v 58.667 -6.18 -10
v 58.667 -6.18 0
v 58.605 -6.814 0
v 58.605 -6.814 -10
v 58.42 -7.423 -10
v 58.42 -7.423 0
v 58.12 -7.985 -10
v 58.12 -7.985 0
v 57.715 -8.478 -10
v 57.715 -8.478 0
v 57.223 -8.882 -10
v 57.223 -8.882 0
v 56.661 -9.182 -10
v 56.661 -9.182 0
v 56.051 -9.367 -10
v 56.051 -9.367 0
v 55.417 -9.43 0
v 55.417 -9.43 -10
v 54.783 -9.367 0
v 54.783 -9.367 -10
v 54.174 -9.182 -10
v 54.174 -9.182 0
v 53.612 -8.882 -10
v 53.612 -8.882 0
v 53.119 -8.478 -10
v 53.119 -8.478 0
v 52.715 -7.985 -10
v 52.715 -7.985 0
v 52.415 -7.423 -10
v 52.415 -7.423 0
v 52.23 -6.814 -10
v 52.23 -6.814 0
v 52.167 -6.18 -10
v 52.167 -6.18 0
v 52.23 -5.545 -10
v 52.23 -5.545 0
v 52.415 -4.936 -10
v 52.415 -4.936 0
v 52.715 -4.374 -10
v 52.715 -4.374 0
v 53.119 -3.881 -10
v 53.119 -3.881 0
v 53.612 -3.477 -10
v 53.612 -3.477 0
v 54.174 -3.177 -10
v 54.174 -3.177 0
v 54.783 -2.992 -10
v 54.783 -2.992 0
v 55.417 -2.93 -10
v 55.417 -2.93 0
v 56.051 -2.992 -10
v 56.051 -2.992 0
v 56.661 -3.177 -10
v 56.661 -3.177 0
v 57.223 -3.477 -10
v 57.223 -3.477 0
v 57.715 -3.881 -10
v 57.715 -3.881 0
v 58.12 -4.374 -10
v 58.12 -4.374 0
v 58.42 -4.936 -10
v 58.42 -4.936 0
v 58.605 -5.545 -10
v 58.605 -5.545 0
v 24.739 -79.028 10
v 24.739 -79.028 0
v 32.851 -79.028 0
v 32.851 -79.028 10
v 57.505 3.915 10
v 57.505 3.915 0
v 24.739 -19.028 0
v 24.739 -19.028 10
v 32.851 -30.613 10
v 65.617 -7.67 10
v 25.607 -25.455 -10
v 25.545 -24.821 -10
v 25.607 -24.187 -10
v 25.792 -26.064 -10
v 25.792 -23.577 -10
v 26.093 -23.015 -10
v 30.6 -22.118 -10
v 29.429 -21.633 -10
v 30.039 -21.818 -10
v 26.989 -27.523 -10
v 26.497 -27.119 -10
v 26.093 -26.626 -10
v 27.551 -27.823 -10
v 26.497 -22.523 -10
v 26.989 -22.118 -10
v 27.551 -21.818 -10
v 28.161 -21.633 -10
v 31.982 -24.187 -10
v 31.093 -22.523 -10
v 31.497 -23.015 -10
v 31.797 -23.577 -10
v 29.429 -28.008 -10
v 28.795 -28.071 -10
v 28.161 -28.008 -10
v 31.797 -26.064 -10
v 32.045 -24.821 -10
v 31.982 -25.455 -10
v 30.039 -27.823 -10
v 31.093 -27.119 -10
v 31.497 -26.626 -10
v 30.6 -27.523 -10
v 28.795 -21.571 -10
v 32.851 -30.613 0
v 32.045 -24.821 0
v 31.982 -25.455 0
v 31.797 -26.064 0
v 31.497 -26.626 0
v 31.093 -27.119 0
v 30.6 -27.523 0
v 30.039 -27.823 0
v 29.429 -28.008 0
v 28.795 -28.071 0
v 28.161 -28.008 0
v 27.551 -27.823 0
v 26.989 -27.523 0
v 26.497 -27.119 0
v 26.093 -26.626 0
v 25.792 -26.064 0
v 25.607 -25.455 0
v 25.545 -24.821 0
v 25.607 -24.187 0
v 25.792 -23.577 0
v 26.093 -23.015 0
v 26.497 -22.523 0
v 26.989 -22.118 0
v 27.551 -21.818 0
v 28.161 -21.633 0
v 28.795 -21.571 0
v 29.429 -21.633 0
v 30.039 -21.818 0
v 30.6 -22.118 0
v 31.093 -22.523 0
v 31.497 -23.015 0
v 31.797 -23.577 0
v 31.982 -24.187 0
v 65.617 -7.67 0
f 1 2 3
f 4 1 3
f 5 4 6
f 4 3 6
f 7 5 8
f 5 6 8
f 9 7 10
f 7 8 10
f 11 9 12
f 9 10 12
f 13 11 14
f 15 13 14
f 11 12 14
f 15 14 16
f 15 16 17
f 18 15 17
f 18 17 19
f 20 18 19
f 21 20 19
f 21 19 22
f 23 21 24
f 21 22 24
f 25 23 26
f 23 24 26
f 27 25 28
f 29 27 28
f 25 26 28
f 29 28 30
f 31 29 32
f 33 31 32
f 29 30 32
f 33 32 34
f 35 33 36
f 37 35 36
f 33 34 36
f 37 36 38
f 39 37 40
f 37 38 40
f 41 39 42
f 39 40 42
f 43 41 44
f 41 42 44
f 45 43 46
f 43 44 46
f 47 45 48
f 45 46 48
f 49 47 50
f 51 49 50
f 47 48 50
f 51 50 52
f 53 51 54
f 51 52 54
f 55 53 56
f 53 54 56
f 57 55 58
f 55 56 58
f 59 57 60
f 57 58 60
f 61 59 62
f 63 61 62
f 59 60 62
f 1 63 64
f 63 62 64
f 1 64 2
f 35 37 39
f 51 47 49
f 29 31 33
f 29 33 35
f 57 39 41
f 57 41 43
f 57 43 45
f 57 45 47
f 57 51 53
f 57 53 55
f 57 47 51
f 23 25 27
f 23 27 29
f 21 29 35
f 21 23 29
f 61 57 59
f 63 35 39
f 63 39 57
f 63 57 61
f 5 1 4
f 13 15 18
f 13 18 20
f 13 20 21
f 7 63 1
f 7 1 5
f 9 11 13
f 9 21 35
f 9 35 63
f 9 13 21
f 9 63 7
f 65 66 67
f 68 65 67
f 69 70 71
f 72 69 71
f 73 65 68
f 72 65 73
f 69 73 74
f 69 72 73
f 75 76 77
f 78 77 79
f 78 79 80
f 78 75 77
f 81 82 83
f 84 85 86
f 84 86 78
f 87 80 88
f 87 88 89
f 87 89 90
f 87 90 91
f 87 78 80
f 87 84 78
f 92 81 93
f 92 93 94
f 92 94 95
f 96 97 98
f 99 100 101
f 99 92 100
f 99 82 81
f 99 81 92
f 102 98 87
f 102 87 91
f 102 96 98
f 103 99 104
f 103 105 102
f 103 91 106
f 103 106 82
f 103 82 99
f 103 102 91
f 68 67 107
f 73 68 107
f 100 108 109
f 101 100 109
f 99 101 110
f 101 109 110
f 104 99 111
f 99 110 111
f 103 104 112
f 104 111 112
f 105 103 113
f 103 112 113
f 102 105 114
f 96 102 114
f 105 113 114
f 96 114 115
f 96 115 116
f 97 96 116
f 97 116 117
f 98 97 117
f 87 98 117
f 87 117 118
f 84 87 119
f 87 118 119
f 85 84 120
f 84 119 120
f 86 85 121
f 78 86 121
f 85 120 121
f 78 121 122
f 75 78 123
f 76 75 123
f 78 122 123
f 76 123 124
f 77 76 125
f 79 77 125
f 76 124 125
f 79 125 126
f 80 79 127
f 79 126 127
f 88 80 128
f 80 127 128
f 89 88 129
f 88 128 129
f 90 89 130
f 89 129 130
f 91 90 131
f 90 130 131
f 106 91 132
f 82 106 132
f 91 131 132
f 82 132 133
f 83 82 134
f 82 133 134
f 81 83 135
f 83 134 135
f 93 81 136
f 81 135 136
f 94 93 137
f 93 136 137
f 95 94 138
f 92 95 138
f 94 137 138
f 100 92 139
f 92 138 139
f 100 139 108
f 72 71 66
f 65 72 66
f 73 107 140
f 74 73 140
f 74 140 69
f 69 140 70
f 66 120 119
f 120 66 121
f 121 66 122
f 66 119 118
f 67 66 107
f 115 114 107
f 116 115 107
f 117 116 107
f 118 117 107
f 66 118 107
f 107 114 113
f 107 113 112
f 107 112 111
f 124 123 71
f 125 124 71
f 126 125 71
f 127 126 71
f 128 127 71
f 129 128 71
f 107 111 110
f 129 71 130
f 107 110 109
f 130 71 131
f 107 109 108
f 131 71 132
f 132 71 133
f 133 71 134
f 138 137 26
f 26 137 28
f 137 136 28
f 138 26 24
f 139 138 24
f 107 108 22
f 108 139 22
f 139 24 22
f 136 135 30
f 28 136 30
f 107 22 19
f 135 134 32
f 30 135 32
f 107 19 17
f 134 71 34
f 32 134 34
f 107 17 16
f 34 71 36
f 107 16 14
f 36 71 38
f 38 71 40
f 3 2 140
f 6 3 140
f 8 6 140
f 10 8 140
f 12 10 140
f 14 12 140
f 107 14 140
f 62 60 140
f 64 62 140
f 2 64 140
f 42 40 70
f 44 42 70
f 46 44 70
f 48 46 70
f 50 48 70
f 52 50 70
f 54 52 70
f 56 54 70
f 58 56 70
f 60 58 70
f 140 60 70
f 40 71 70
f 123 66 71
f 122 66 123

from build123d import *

# Parameters (mm, degrees)
BOSS_EXTRUDE1_DEPTH = 10
SKETCH3_R           = 3.25
BOSS_EXTRUDE3_DEPTH = 10


with BuildPart() as part:
    # Sketch1 → Boss-Extrude1 (new body)
    with BuildSketch(Plane.XY):
        Polygon((57.505122166, 3.914590247), (24.739040394, -19.028467207), (24.739040394, -79.028467207), (32.850636148, -79.028467207), (32.850636148, -30.613026513), (65.616717919, -7.669969059), align=None)
    extrude(amount=BOSS_EXTRUDE1_DEPTH)

    # Sketch3 → Boss-Extrude3 (add)
    with BuildSketch(Plane(origin=(0, 0, 0), x_dir=(-1, 0, 0), z_dir=(0, 0, -1))):
        with Locations(Location((-55.41727971, -6.179512679, 0), (0, 0, 180))):
            Circle(SKETCH3_R)
        with Locations(Location((-28.794838271, -24.82074686, 0), (0, 0, 180))):
            Circle(SKETCH3_R)
    extrude(amount=BOSS_EXTRUDE3_DEPTH)


solid = part.part
